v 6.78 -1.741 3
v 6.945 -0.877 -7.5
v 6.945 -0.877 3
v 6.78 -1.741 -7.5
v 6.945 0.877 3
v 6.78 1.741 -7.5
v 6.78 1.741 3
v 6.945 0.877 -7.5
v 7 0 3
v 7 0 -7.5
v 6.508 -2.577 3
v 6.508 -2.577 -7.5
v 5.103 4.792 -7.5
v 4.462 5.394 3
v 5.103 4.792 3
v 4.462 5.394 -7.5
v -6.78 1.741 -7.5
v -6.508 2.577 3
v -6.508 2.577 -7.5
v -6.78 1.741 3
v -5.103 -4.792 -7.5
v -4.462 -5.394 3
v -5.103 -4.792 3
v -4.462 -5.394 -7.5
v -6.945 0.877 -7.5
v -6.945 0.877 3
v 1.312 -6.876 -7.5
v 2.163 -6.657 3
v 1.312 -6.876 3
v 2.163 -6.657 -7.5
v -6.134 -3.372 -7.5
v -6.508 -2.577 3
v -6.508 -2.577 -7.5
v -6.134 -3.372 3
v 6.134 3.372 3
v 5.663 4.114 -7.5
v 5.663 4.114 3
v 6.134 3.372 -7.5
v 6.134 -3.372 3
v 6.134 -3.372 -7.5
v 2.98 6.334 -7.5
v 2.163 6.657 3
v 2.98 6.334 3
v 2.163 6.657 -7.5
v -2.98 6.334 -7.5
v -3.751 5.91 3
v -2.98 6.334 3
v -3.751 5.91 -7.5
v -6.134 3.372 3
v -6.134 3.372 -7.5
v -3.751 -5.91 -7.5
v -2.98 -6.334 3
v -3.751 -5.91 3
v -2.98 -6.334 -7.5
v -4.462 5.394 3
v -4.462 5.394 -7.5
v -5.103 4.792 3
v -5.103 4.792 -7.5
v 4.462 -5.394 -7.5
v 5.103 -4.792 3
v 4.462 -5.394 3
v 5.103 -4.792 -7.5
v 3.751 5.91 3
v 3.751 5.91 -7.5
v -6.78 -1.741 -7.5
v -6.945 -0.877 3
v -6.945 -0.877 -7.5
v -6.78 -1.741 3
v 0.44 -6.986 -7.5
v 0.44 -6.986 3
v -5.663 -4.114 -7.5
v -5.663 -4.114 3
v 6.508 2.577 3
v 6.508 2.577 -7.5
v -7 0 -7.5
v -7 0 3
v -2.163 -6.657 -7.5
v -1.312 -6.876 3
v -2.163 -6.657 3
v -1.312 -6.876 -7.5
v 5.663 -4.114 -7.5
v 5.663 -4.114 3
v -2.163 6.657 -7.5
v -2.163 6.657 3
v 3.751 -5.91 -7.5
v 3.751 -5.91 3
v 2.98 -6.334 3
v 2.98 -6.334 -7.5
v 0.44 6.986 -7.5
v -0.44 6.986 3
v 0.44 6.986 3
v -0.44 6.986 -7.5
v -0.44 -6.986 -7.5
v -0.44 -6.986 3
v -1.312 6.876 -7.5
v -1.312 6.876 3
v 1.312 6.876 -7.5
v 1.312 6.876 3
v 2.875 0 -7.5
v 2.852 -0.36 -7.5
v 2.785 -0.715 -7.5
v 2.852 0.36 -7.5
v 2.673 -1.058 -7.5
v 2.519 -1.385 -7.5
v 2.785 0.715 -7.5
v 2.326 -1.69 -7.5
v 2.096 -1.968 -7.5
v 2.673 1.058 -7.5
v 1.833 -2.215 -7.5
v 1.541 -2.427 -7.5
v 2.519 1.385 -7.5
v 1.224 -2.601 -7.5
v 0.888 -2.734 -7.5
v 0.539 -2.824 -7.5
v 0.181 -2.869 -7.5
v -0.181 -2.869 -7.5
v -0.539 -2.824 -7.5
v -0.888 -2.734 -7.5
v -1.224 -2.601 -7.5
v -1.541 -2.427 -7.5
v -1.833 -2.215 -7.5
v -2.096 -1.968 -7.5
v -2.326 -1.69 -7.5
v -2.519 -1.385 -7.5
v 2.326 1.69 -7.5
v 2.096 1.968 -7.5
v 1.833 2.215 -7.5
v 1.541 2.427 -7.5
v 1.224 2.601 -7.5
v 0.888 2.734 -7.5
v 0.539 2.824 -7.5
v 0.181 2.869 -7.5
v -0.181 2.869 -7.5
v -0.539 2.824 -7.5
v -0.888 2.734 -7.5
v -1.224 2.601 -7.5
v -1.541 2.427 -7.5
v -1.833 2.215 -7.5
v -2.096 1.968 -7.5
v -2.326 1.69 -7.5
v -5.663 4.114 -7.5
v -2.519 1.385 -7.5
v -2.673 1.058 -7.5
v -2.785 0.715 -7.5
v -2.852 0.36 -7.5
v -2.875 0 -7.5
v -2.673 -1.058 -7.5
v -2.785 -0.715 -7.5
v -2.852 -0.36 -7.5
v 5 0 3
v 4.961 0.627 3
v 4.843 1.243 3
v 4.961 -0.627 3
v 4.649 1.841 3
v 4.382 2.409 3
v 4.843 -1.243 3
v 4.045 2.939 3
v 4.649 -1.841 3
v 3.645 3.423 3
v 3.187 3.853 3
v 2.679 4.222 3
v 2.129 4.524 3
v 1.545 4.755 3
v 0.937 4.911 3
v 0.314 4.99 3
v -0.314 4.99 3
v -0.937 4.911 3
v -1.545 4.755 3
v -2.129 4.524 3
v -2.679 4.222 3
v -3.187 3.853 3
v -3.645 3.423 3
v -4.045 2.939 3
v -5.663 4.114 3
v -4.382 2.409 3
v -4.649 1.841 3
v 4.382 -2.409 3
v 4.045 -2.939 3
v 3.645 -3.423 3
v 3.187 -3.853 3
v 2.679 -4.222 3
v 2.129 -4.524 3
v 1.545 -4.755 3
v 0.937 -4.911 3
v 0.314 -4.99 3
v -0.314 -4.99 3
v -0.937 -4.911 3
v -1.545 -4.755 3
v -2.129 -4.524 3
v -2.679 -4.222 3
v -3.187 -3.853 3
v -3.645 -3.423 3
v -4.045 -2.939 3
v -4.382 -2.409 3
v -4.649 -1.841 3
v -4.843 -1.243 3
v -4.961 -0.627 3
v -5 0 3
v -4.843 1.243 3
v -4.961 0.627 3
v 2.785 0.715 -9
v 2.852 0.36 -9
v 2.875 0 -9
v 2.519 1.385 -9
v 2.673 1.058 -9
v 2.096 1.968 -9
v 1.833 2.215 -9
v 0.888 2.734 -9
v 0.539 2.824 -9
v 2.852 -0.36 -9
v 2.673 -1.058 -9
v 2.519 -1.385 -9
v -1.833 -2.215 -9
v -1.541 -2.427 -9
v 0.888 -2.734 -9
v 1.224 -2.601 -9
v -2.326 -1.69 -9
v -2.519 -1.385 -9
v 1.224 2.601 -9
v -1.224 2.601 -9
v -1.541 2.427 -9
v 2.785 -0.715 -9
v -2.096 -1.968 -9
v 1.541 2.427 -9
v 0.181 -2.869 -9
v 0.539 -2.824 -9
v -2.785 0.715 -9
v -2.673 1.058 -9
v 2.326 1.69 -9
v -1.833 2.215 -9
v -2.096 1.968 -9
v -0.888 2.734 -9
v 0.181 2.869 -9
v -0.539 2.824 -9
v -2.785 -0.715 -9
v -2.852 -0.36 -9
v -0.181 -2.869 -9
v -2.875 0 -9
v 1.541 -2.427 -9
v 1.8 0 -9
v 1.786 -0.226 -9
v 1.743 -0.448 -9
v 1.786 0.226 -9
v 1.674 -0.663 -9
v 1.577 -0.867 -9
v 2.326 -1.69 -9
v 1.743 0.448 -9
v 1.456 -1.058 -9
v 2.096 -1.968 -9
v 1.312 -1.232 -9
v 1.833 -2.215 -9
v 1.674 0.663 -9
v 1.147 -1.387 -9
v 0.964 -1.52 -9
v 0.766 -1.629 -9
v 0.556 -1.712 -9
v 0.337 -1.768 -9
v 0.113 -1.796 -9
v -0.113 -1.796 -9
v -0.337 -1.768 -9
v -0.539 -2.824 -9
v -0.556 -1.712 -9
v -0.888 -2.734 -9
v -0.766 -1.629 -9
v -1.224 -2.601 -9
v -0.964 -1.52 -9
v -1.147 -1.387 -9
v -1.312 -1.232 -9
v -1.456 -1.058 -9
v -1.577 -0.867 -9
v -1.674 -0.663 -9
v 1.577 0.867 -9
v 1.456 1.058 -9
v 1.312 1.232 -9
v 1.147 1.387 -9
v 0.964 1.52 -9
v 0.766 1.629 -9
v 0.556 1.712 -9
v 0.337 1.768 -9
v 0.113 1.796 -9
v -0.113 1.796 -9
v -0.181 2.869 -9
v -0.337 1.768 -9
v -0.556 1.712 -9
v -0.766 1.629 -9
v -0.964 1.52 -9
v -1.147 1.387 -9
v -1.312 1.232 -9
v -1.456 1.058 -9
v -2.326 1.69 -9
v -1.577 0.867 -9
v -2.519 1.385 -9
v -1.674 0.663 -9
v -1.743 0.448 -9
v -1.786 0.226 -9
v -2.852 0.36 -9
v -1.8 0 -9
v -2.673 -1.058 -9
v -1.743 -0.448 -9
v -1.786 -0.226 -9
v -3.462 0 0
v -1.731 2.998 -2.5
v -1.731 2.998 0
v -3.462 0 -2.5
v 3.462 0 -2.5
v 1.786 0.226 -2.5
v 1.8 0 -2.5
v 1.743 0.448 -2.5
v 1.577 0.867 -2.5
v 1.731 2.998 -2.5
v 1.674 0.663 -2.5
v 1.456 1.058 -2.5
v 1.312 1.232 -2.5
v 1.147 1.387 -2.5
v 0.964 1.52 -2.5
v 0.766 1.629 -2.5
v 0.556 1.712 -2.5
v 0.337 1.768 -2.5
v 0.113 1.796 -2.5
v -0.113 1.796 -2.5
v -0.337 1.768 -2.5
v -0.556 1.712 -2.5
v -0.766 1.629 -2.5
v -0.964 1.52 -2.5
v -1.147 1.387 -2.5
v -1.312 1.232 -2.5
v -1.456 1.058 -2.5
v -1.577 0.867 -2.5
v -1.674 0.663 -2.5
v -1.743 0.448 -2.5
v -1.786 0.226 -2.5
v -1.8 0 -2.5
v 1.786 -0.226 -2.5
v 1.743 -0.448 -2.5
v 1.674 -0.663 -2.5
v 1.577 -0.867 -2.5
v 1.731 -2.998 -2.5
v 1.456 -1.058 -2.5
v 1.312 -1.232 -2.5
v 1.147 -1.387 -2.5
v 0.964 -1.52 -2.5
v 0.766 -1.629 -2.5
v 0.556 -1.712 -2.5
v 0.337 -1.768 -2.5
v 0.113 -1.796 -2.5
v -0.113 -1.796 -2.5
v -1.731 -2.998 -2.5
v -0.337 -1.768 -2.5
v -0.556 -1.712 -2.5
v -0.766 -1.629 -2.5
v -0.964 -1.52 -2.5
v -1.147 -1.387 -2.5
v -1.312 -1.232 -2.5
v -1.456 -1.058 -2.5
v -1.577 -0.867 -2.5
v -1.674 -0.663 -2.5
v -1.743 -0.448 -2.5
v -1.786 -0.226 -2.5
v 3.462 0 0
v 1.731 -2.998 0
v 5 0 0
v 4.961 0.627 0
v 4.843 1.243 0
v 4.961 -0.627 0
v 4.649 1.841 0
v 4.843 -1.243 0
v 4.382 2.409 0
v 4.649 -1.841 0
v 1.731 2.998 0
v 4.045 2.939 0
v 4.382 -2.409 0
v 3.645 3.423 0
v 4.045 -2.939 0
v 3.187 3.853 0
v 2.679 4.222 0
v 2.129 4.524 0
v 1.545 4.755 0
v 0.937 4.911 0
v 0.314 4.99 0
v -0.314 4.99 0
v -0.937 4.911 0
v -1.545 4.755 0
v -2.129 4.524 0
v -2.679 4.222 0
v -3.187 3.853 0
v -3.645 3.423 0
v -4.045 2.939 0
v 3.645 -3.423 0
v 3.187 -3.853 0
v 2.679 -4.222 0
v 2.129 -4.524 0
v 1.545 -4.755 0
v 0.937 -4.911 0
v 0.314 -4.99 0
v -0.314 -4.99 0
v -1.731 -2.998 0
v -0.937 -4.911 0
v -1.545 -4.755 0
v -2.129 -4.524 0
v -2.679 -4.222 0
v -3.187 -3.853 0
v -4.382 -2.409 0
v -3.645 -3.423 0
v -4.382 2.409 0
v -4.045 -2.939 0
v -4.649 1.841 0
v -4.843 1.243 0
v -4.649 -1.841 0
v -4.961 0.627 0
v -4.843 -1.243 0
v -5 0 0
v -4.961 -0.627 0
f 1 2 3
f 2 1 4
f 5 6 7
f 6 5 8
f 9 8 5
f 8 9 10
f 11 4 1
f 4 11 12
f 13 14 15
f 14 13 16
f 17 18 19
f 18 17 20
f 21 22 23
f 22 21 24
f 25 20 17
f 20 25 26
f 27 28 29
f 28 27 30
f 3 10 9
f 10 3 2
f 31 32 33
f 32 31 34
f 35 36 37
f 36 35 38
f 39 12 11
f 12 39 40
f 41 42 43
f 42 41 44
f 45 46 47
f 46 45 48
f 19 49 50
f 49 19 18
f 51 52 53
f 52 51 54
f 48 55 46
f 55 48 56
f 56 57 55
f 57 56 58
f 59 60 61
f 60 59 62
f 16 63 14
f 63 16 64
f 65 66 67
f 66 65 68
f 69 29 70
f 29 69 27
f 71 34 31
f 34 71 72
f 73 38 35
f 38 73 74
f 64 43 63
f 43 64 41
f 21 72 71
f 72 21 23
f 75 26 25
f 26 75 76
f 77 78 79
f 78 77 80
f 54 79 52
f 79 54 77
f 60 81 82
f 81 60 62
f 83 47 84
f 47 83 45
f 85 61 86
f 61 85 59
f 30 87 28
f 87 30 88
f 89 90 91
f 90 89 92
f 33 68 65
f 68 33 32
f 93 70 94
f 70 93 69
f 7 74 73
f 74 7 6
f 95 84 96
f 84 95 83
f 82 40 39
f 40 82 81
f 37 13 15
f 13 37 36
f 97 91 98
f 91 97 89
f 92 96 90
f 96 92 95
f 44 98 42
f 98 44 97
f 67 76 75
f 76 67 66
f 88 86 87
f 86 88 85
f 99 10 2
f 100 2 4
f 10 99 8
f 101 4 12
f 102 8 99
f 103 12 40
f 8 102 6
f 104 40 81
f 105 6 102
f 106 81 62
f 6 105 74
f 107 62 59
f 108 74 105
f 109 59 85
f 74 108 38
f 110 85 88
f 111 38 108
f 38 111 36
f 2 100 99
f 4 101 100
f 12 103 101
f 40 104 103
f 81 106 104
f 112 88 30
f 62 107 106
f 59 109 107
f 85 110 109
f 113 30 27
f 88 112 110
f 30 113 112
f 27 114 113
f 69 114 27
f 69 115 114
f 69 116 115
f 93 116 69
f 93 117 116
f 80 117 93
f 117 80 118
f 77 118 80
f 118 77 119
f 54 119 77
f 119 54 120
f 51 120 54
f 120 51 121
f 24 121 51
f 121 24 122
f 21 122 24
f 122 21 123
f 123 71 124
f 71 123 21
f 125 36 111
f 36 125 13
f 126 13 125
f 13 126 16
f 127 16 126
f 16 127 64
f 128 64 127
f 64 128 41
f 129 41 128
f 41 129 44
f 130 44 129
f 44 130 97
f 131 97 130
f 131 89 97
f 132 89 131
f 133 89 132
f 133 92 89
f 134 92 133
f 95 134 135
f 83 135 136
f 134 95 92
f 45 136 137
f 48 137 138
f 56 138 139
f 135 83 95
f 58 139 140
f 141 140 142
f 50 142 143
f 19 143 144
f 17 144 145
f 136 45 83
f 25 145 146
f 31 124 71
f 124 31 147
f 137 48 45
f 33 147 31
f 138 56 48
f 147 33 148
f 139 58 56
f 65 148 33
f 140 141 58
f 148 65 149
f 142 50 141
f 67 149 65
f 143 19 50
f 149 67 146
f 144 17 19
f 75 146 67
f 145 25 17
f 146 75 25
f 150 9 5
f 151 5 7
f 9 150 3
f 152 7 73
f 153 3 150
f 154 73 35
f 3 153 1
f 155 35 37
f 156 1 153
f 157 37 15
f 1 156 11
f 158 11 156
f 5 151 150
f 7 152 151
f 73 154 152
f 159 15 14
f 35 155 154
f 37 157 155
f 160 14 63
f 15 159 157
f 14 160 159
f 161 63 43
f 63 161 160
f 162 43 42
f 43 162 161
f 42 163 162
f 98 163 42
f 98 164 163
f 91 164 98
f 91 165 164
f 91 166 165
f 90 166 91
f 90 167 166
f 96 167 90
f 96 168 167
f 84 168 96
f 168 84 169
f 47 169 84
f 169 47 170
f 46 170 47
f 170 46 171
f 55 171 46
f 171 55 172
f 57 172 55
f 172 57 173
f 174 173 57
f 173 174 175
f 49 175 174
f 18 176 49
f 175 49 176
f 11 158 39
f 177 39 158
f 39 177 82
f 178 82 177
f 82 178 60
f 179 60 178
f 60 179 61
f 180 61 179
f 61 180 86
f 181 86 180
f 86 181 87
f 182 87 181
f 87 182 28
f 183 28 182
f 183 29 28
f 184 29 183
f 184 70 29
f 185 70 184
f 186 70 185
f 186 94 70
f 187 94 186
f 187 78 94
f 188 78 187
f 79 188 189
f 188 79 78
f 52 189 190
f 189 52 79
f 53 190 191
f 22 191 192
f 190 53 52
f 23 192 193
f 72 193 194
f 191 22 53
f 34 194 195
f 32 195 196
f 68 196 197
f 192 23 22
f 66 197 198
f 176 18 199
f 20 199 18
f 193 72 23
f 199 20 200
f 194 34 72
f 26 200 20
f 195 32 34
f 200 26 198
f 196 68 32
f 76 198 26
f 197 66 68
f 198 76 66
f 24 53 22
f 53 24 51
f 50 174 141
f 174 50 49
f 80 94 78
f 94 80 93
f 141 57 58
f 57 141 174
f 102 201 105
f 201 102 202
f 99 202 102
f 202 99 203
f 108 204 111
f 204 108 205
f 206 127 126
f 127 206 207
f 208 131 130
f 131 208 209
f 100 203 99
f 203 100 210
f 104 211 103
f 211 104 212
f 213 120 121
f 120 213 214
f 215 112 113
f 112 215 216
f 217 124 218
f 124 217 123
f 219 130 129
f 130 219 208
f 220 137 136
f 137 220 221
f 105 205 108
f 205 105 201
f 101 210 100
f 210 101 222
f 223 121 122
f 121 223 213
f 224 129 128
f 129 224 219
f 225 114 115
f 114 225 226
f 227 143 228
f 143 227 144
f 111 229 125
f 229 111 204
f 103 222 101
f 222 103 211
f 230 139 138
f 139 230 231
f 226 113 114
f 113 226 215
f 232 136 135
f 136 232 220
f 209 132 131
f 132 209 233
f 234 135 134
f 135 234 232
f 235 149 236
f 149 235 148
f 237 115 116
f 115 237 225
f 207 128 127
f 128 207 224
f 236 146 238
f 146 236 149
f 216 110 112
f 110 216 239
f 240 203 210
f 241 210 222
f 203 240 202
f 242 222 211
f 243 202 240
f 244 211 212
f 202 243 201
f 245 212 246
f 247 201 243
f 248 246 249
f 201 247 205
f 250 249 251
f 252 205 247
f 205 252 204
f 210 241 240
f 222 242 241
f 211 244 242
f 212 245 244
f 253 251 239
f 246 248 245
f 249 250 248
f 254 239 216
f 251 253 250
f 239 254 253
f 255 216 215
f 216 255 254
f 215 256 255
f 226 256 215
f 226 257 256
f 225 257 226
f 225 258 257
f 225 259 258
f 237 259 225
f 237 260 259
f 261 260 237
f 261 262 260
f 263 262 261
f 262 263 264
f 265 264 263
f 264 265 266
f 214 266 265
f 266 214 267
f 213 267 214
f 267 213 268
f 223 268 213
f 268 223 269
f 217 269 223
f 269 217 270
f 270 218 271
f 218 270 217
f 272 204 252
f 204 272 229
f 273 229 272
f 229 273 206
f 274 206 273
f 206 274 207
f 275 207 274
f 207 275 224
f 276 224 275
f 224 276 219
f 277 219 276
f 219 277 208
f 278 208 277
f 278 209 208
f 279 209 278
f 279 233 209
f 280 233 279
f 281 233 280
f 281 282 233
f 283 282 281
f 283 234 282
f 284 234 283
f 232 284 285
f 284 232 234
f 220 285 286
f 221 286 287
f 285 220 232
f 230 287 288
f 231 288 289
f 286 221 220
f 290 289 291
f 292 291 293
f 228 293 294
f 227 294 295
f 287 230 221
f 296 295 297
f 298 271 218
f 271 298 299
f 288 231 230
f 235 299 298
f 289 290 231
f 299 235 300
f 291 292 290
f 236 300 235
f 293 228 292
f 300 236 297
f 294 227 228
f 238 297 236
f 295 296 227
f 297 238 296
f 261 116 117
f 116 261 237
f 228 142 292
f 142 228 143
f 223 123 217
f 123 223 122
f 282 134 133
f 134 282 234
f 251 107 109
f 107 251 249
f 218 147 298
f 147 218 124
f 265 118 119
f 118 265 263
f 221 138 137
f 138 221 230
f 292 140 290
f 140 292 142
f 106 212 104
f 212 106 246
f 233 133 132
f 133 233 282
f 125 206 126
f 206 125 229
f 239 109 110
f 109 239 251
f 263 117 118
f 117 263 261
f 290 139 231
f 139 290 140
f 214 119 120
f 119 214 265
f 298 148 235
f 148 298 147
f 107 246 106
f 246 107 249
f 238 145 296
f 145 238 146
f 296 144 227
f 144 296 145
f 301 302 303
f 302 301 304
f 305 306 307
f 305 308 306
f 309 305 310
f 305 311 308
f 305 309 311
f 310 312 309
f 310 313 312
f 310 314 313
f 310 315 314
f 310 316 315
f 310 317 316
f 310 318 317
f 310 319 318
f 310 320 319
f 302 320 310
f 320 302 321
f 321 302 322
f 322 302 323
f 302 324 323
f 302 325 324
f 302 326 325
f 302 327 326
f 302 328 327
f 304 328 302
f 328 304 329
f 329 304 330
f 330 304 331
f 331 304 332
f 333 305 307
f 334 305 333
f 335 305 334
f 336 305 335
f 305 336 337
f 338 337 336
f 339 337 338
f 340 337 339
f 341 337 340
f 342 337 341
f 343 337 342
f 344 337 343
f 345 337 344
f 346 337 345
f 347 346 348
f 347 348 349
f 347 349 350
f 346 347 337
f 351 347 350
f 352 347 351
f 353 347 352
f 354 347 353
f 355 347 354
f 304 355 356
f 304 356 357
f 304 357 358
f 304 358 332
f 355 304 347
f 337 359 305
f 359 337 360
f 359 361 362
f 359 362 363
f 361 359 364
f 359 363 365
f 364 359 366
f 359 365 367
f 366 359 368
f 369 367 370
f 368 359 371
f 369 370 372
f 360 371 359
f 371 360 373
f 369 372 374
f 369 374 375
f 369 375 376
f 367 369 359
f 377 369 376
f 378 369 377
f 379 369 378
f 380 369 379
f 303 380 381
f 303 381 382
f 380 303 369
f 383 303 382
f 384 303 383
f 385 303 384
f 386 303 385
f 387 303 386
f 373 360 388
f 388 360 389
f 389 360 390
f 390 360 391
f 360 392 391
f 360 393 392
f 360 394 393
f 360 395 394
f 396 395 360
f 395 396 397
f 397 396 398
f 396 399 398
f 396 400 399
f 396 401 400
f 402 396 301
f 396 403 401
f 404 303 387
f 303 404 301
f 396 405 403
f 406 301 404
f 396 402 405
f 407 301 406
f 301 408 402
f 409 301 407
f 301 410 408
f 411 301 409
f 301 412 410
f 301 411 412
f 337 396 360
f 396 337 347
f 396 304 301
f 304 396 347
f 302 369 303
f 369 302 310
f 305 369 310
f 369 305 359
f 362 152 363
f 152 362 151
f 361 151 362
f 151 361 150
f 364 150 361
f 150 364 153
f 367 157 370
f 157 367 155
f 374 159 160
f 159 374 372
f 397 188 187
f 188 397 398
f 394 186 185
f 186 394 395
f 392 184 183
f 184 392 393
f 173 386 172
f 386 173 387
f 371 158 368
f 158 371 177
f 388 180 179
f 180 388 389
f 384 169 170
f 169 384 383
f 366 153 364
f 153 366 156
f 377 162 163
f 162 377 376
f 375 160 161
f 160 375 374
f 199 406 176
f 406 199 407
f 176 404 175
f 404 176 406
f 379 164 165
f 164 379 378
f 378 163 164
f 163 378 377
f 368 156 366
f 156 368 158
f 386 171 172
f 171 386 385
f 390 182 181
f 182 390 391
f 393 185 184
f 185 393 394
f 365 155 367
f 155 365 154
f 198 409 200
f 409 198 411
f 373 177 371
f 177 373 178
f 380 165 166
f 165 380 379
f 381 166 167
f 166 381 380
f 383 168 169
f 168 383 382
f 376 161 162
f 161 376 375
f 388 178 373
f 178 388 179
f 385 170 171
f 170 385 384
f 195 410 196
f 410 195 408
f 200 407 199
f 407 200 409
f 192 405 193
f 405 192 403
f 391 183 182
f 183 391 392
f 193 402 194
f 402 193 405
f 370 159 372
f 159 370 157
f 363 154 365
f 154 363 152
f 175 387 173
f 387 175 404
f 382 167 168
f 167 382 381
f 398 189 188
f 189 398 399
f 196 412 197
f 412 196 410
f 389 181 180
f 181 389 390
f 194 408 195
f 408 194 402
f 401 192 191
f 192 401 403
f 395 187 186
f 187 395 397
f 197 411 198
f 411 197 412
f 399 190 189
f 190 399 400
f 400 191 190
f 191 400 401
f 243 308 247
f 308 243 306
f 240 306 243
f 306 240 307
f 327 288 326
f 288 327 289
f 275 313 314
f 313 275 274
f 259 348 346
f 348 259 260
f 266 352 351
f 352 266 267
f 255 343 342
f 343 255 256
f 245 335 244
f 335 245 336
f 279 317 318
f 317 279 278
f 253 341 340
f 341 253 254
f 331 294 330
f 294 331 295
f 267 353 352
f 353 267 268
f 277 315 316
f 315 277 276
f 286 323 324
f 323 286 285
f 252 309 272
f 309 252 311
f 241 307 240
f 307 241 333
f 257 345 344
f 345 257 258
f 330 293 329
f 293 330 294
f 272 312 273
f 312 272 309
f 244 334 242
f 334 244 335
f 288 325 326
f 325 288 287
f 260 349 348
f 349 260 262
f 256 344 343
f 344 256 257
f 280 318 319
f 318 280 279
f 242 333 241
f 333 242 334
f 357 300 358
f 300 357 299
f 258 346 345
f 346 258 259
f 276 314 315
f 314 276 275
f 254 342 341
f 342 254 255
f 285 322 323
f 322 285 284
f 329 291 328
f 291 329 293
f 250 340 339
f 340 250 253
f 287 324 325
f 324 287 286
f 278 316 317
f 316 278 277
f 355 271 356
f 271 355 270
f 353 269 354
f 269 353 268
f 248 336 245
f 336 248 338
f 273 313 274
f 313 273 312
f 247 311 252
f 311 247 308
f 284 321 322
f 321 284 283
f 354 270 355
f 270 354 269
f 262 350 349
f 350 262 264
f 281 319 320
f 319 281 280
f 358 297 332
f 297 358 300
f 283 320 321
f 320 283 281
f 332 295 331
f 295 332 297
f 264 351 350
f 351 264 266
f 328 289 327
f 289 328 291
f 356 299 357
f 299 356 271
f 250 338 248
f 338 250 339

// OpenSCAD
$fn = 50;


difference() {
	union() {
		translate(v = [0, 0, -7.5000000000]) {
			cylinder(h = 10.5000000000, r = 7.0000000000);
		}
		#translate(v = [0, 0, -9.0000000000]) {
			cylinder(h = 9, r = 2.8750000000);
		}
	}
	union() {
		translate(v = [0, 0, 0]) {
			rotate(a = [0, 0, 0]) {
				difference() {
					union() {
						translate(v = [0, 0, -2.5000000000]) {
							linear_extrude(height = 2.5000000000) {
								polygon(points = [[3.4620000000, 0.0000000000], [1.7310000000, 2.9981799479], [-1.7310000000, 2.9981799479], [-3.4620000000, 0.0000000000], [-1.7310000000, -2.9981799479], [1.7310000000, -2.9981799479]]);
							}
						}
					}
					union();
				}
			}
		}
		#cylinder(h = 3, r = 5.0000000000);
		#translate(v = [0, 0, -100.0000000000]) {
			cylinder(h = 200, r = 1.8000000000);
		}
	}
}
